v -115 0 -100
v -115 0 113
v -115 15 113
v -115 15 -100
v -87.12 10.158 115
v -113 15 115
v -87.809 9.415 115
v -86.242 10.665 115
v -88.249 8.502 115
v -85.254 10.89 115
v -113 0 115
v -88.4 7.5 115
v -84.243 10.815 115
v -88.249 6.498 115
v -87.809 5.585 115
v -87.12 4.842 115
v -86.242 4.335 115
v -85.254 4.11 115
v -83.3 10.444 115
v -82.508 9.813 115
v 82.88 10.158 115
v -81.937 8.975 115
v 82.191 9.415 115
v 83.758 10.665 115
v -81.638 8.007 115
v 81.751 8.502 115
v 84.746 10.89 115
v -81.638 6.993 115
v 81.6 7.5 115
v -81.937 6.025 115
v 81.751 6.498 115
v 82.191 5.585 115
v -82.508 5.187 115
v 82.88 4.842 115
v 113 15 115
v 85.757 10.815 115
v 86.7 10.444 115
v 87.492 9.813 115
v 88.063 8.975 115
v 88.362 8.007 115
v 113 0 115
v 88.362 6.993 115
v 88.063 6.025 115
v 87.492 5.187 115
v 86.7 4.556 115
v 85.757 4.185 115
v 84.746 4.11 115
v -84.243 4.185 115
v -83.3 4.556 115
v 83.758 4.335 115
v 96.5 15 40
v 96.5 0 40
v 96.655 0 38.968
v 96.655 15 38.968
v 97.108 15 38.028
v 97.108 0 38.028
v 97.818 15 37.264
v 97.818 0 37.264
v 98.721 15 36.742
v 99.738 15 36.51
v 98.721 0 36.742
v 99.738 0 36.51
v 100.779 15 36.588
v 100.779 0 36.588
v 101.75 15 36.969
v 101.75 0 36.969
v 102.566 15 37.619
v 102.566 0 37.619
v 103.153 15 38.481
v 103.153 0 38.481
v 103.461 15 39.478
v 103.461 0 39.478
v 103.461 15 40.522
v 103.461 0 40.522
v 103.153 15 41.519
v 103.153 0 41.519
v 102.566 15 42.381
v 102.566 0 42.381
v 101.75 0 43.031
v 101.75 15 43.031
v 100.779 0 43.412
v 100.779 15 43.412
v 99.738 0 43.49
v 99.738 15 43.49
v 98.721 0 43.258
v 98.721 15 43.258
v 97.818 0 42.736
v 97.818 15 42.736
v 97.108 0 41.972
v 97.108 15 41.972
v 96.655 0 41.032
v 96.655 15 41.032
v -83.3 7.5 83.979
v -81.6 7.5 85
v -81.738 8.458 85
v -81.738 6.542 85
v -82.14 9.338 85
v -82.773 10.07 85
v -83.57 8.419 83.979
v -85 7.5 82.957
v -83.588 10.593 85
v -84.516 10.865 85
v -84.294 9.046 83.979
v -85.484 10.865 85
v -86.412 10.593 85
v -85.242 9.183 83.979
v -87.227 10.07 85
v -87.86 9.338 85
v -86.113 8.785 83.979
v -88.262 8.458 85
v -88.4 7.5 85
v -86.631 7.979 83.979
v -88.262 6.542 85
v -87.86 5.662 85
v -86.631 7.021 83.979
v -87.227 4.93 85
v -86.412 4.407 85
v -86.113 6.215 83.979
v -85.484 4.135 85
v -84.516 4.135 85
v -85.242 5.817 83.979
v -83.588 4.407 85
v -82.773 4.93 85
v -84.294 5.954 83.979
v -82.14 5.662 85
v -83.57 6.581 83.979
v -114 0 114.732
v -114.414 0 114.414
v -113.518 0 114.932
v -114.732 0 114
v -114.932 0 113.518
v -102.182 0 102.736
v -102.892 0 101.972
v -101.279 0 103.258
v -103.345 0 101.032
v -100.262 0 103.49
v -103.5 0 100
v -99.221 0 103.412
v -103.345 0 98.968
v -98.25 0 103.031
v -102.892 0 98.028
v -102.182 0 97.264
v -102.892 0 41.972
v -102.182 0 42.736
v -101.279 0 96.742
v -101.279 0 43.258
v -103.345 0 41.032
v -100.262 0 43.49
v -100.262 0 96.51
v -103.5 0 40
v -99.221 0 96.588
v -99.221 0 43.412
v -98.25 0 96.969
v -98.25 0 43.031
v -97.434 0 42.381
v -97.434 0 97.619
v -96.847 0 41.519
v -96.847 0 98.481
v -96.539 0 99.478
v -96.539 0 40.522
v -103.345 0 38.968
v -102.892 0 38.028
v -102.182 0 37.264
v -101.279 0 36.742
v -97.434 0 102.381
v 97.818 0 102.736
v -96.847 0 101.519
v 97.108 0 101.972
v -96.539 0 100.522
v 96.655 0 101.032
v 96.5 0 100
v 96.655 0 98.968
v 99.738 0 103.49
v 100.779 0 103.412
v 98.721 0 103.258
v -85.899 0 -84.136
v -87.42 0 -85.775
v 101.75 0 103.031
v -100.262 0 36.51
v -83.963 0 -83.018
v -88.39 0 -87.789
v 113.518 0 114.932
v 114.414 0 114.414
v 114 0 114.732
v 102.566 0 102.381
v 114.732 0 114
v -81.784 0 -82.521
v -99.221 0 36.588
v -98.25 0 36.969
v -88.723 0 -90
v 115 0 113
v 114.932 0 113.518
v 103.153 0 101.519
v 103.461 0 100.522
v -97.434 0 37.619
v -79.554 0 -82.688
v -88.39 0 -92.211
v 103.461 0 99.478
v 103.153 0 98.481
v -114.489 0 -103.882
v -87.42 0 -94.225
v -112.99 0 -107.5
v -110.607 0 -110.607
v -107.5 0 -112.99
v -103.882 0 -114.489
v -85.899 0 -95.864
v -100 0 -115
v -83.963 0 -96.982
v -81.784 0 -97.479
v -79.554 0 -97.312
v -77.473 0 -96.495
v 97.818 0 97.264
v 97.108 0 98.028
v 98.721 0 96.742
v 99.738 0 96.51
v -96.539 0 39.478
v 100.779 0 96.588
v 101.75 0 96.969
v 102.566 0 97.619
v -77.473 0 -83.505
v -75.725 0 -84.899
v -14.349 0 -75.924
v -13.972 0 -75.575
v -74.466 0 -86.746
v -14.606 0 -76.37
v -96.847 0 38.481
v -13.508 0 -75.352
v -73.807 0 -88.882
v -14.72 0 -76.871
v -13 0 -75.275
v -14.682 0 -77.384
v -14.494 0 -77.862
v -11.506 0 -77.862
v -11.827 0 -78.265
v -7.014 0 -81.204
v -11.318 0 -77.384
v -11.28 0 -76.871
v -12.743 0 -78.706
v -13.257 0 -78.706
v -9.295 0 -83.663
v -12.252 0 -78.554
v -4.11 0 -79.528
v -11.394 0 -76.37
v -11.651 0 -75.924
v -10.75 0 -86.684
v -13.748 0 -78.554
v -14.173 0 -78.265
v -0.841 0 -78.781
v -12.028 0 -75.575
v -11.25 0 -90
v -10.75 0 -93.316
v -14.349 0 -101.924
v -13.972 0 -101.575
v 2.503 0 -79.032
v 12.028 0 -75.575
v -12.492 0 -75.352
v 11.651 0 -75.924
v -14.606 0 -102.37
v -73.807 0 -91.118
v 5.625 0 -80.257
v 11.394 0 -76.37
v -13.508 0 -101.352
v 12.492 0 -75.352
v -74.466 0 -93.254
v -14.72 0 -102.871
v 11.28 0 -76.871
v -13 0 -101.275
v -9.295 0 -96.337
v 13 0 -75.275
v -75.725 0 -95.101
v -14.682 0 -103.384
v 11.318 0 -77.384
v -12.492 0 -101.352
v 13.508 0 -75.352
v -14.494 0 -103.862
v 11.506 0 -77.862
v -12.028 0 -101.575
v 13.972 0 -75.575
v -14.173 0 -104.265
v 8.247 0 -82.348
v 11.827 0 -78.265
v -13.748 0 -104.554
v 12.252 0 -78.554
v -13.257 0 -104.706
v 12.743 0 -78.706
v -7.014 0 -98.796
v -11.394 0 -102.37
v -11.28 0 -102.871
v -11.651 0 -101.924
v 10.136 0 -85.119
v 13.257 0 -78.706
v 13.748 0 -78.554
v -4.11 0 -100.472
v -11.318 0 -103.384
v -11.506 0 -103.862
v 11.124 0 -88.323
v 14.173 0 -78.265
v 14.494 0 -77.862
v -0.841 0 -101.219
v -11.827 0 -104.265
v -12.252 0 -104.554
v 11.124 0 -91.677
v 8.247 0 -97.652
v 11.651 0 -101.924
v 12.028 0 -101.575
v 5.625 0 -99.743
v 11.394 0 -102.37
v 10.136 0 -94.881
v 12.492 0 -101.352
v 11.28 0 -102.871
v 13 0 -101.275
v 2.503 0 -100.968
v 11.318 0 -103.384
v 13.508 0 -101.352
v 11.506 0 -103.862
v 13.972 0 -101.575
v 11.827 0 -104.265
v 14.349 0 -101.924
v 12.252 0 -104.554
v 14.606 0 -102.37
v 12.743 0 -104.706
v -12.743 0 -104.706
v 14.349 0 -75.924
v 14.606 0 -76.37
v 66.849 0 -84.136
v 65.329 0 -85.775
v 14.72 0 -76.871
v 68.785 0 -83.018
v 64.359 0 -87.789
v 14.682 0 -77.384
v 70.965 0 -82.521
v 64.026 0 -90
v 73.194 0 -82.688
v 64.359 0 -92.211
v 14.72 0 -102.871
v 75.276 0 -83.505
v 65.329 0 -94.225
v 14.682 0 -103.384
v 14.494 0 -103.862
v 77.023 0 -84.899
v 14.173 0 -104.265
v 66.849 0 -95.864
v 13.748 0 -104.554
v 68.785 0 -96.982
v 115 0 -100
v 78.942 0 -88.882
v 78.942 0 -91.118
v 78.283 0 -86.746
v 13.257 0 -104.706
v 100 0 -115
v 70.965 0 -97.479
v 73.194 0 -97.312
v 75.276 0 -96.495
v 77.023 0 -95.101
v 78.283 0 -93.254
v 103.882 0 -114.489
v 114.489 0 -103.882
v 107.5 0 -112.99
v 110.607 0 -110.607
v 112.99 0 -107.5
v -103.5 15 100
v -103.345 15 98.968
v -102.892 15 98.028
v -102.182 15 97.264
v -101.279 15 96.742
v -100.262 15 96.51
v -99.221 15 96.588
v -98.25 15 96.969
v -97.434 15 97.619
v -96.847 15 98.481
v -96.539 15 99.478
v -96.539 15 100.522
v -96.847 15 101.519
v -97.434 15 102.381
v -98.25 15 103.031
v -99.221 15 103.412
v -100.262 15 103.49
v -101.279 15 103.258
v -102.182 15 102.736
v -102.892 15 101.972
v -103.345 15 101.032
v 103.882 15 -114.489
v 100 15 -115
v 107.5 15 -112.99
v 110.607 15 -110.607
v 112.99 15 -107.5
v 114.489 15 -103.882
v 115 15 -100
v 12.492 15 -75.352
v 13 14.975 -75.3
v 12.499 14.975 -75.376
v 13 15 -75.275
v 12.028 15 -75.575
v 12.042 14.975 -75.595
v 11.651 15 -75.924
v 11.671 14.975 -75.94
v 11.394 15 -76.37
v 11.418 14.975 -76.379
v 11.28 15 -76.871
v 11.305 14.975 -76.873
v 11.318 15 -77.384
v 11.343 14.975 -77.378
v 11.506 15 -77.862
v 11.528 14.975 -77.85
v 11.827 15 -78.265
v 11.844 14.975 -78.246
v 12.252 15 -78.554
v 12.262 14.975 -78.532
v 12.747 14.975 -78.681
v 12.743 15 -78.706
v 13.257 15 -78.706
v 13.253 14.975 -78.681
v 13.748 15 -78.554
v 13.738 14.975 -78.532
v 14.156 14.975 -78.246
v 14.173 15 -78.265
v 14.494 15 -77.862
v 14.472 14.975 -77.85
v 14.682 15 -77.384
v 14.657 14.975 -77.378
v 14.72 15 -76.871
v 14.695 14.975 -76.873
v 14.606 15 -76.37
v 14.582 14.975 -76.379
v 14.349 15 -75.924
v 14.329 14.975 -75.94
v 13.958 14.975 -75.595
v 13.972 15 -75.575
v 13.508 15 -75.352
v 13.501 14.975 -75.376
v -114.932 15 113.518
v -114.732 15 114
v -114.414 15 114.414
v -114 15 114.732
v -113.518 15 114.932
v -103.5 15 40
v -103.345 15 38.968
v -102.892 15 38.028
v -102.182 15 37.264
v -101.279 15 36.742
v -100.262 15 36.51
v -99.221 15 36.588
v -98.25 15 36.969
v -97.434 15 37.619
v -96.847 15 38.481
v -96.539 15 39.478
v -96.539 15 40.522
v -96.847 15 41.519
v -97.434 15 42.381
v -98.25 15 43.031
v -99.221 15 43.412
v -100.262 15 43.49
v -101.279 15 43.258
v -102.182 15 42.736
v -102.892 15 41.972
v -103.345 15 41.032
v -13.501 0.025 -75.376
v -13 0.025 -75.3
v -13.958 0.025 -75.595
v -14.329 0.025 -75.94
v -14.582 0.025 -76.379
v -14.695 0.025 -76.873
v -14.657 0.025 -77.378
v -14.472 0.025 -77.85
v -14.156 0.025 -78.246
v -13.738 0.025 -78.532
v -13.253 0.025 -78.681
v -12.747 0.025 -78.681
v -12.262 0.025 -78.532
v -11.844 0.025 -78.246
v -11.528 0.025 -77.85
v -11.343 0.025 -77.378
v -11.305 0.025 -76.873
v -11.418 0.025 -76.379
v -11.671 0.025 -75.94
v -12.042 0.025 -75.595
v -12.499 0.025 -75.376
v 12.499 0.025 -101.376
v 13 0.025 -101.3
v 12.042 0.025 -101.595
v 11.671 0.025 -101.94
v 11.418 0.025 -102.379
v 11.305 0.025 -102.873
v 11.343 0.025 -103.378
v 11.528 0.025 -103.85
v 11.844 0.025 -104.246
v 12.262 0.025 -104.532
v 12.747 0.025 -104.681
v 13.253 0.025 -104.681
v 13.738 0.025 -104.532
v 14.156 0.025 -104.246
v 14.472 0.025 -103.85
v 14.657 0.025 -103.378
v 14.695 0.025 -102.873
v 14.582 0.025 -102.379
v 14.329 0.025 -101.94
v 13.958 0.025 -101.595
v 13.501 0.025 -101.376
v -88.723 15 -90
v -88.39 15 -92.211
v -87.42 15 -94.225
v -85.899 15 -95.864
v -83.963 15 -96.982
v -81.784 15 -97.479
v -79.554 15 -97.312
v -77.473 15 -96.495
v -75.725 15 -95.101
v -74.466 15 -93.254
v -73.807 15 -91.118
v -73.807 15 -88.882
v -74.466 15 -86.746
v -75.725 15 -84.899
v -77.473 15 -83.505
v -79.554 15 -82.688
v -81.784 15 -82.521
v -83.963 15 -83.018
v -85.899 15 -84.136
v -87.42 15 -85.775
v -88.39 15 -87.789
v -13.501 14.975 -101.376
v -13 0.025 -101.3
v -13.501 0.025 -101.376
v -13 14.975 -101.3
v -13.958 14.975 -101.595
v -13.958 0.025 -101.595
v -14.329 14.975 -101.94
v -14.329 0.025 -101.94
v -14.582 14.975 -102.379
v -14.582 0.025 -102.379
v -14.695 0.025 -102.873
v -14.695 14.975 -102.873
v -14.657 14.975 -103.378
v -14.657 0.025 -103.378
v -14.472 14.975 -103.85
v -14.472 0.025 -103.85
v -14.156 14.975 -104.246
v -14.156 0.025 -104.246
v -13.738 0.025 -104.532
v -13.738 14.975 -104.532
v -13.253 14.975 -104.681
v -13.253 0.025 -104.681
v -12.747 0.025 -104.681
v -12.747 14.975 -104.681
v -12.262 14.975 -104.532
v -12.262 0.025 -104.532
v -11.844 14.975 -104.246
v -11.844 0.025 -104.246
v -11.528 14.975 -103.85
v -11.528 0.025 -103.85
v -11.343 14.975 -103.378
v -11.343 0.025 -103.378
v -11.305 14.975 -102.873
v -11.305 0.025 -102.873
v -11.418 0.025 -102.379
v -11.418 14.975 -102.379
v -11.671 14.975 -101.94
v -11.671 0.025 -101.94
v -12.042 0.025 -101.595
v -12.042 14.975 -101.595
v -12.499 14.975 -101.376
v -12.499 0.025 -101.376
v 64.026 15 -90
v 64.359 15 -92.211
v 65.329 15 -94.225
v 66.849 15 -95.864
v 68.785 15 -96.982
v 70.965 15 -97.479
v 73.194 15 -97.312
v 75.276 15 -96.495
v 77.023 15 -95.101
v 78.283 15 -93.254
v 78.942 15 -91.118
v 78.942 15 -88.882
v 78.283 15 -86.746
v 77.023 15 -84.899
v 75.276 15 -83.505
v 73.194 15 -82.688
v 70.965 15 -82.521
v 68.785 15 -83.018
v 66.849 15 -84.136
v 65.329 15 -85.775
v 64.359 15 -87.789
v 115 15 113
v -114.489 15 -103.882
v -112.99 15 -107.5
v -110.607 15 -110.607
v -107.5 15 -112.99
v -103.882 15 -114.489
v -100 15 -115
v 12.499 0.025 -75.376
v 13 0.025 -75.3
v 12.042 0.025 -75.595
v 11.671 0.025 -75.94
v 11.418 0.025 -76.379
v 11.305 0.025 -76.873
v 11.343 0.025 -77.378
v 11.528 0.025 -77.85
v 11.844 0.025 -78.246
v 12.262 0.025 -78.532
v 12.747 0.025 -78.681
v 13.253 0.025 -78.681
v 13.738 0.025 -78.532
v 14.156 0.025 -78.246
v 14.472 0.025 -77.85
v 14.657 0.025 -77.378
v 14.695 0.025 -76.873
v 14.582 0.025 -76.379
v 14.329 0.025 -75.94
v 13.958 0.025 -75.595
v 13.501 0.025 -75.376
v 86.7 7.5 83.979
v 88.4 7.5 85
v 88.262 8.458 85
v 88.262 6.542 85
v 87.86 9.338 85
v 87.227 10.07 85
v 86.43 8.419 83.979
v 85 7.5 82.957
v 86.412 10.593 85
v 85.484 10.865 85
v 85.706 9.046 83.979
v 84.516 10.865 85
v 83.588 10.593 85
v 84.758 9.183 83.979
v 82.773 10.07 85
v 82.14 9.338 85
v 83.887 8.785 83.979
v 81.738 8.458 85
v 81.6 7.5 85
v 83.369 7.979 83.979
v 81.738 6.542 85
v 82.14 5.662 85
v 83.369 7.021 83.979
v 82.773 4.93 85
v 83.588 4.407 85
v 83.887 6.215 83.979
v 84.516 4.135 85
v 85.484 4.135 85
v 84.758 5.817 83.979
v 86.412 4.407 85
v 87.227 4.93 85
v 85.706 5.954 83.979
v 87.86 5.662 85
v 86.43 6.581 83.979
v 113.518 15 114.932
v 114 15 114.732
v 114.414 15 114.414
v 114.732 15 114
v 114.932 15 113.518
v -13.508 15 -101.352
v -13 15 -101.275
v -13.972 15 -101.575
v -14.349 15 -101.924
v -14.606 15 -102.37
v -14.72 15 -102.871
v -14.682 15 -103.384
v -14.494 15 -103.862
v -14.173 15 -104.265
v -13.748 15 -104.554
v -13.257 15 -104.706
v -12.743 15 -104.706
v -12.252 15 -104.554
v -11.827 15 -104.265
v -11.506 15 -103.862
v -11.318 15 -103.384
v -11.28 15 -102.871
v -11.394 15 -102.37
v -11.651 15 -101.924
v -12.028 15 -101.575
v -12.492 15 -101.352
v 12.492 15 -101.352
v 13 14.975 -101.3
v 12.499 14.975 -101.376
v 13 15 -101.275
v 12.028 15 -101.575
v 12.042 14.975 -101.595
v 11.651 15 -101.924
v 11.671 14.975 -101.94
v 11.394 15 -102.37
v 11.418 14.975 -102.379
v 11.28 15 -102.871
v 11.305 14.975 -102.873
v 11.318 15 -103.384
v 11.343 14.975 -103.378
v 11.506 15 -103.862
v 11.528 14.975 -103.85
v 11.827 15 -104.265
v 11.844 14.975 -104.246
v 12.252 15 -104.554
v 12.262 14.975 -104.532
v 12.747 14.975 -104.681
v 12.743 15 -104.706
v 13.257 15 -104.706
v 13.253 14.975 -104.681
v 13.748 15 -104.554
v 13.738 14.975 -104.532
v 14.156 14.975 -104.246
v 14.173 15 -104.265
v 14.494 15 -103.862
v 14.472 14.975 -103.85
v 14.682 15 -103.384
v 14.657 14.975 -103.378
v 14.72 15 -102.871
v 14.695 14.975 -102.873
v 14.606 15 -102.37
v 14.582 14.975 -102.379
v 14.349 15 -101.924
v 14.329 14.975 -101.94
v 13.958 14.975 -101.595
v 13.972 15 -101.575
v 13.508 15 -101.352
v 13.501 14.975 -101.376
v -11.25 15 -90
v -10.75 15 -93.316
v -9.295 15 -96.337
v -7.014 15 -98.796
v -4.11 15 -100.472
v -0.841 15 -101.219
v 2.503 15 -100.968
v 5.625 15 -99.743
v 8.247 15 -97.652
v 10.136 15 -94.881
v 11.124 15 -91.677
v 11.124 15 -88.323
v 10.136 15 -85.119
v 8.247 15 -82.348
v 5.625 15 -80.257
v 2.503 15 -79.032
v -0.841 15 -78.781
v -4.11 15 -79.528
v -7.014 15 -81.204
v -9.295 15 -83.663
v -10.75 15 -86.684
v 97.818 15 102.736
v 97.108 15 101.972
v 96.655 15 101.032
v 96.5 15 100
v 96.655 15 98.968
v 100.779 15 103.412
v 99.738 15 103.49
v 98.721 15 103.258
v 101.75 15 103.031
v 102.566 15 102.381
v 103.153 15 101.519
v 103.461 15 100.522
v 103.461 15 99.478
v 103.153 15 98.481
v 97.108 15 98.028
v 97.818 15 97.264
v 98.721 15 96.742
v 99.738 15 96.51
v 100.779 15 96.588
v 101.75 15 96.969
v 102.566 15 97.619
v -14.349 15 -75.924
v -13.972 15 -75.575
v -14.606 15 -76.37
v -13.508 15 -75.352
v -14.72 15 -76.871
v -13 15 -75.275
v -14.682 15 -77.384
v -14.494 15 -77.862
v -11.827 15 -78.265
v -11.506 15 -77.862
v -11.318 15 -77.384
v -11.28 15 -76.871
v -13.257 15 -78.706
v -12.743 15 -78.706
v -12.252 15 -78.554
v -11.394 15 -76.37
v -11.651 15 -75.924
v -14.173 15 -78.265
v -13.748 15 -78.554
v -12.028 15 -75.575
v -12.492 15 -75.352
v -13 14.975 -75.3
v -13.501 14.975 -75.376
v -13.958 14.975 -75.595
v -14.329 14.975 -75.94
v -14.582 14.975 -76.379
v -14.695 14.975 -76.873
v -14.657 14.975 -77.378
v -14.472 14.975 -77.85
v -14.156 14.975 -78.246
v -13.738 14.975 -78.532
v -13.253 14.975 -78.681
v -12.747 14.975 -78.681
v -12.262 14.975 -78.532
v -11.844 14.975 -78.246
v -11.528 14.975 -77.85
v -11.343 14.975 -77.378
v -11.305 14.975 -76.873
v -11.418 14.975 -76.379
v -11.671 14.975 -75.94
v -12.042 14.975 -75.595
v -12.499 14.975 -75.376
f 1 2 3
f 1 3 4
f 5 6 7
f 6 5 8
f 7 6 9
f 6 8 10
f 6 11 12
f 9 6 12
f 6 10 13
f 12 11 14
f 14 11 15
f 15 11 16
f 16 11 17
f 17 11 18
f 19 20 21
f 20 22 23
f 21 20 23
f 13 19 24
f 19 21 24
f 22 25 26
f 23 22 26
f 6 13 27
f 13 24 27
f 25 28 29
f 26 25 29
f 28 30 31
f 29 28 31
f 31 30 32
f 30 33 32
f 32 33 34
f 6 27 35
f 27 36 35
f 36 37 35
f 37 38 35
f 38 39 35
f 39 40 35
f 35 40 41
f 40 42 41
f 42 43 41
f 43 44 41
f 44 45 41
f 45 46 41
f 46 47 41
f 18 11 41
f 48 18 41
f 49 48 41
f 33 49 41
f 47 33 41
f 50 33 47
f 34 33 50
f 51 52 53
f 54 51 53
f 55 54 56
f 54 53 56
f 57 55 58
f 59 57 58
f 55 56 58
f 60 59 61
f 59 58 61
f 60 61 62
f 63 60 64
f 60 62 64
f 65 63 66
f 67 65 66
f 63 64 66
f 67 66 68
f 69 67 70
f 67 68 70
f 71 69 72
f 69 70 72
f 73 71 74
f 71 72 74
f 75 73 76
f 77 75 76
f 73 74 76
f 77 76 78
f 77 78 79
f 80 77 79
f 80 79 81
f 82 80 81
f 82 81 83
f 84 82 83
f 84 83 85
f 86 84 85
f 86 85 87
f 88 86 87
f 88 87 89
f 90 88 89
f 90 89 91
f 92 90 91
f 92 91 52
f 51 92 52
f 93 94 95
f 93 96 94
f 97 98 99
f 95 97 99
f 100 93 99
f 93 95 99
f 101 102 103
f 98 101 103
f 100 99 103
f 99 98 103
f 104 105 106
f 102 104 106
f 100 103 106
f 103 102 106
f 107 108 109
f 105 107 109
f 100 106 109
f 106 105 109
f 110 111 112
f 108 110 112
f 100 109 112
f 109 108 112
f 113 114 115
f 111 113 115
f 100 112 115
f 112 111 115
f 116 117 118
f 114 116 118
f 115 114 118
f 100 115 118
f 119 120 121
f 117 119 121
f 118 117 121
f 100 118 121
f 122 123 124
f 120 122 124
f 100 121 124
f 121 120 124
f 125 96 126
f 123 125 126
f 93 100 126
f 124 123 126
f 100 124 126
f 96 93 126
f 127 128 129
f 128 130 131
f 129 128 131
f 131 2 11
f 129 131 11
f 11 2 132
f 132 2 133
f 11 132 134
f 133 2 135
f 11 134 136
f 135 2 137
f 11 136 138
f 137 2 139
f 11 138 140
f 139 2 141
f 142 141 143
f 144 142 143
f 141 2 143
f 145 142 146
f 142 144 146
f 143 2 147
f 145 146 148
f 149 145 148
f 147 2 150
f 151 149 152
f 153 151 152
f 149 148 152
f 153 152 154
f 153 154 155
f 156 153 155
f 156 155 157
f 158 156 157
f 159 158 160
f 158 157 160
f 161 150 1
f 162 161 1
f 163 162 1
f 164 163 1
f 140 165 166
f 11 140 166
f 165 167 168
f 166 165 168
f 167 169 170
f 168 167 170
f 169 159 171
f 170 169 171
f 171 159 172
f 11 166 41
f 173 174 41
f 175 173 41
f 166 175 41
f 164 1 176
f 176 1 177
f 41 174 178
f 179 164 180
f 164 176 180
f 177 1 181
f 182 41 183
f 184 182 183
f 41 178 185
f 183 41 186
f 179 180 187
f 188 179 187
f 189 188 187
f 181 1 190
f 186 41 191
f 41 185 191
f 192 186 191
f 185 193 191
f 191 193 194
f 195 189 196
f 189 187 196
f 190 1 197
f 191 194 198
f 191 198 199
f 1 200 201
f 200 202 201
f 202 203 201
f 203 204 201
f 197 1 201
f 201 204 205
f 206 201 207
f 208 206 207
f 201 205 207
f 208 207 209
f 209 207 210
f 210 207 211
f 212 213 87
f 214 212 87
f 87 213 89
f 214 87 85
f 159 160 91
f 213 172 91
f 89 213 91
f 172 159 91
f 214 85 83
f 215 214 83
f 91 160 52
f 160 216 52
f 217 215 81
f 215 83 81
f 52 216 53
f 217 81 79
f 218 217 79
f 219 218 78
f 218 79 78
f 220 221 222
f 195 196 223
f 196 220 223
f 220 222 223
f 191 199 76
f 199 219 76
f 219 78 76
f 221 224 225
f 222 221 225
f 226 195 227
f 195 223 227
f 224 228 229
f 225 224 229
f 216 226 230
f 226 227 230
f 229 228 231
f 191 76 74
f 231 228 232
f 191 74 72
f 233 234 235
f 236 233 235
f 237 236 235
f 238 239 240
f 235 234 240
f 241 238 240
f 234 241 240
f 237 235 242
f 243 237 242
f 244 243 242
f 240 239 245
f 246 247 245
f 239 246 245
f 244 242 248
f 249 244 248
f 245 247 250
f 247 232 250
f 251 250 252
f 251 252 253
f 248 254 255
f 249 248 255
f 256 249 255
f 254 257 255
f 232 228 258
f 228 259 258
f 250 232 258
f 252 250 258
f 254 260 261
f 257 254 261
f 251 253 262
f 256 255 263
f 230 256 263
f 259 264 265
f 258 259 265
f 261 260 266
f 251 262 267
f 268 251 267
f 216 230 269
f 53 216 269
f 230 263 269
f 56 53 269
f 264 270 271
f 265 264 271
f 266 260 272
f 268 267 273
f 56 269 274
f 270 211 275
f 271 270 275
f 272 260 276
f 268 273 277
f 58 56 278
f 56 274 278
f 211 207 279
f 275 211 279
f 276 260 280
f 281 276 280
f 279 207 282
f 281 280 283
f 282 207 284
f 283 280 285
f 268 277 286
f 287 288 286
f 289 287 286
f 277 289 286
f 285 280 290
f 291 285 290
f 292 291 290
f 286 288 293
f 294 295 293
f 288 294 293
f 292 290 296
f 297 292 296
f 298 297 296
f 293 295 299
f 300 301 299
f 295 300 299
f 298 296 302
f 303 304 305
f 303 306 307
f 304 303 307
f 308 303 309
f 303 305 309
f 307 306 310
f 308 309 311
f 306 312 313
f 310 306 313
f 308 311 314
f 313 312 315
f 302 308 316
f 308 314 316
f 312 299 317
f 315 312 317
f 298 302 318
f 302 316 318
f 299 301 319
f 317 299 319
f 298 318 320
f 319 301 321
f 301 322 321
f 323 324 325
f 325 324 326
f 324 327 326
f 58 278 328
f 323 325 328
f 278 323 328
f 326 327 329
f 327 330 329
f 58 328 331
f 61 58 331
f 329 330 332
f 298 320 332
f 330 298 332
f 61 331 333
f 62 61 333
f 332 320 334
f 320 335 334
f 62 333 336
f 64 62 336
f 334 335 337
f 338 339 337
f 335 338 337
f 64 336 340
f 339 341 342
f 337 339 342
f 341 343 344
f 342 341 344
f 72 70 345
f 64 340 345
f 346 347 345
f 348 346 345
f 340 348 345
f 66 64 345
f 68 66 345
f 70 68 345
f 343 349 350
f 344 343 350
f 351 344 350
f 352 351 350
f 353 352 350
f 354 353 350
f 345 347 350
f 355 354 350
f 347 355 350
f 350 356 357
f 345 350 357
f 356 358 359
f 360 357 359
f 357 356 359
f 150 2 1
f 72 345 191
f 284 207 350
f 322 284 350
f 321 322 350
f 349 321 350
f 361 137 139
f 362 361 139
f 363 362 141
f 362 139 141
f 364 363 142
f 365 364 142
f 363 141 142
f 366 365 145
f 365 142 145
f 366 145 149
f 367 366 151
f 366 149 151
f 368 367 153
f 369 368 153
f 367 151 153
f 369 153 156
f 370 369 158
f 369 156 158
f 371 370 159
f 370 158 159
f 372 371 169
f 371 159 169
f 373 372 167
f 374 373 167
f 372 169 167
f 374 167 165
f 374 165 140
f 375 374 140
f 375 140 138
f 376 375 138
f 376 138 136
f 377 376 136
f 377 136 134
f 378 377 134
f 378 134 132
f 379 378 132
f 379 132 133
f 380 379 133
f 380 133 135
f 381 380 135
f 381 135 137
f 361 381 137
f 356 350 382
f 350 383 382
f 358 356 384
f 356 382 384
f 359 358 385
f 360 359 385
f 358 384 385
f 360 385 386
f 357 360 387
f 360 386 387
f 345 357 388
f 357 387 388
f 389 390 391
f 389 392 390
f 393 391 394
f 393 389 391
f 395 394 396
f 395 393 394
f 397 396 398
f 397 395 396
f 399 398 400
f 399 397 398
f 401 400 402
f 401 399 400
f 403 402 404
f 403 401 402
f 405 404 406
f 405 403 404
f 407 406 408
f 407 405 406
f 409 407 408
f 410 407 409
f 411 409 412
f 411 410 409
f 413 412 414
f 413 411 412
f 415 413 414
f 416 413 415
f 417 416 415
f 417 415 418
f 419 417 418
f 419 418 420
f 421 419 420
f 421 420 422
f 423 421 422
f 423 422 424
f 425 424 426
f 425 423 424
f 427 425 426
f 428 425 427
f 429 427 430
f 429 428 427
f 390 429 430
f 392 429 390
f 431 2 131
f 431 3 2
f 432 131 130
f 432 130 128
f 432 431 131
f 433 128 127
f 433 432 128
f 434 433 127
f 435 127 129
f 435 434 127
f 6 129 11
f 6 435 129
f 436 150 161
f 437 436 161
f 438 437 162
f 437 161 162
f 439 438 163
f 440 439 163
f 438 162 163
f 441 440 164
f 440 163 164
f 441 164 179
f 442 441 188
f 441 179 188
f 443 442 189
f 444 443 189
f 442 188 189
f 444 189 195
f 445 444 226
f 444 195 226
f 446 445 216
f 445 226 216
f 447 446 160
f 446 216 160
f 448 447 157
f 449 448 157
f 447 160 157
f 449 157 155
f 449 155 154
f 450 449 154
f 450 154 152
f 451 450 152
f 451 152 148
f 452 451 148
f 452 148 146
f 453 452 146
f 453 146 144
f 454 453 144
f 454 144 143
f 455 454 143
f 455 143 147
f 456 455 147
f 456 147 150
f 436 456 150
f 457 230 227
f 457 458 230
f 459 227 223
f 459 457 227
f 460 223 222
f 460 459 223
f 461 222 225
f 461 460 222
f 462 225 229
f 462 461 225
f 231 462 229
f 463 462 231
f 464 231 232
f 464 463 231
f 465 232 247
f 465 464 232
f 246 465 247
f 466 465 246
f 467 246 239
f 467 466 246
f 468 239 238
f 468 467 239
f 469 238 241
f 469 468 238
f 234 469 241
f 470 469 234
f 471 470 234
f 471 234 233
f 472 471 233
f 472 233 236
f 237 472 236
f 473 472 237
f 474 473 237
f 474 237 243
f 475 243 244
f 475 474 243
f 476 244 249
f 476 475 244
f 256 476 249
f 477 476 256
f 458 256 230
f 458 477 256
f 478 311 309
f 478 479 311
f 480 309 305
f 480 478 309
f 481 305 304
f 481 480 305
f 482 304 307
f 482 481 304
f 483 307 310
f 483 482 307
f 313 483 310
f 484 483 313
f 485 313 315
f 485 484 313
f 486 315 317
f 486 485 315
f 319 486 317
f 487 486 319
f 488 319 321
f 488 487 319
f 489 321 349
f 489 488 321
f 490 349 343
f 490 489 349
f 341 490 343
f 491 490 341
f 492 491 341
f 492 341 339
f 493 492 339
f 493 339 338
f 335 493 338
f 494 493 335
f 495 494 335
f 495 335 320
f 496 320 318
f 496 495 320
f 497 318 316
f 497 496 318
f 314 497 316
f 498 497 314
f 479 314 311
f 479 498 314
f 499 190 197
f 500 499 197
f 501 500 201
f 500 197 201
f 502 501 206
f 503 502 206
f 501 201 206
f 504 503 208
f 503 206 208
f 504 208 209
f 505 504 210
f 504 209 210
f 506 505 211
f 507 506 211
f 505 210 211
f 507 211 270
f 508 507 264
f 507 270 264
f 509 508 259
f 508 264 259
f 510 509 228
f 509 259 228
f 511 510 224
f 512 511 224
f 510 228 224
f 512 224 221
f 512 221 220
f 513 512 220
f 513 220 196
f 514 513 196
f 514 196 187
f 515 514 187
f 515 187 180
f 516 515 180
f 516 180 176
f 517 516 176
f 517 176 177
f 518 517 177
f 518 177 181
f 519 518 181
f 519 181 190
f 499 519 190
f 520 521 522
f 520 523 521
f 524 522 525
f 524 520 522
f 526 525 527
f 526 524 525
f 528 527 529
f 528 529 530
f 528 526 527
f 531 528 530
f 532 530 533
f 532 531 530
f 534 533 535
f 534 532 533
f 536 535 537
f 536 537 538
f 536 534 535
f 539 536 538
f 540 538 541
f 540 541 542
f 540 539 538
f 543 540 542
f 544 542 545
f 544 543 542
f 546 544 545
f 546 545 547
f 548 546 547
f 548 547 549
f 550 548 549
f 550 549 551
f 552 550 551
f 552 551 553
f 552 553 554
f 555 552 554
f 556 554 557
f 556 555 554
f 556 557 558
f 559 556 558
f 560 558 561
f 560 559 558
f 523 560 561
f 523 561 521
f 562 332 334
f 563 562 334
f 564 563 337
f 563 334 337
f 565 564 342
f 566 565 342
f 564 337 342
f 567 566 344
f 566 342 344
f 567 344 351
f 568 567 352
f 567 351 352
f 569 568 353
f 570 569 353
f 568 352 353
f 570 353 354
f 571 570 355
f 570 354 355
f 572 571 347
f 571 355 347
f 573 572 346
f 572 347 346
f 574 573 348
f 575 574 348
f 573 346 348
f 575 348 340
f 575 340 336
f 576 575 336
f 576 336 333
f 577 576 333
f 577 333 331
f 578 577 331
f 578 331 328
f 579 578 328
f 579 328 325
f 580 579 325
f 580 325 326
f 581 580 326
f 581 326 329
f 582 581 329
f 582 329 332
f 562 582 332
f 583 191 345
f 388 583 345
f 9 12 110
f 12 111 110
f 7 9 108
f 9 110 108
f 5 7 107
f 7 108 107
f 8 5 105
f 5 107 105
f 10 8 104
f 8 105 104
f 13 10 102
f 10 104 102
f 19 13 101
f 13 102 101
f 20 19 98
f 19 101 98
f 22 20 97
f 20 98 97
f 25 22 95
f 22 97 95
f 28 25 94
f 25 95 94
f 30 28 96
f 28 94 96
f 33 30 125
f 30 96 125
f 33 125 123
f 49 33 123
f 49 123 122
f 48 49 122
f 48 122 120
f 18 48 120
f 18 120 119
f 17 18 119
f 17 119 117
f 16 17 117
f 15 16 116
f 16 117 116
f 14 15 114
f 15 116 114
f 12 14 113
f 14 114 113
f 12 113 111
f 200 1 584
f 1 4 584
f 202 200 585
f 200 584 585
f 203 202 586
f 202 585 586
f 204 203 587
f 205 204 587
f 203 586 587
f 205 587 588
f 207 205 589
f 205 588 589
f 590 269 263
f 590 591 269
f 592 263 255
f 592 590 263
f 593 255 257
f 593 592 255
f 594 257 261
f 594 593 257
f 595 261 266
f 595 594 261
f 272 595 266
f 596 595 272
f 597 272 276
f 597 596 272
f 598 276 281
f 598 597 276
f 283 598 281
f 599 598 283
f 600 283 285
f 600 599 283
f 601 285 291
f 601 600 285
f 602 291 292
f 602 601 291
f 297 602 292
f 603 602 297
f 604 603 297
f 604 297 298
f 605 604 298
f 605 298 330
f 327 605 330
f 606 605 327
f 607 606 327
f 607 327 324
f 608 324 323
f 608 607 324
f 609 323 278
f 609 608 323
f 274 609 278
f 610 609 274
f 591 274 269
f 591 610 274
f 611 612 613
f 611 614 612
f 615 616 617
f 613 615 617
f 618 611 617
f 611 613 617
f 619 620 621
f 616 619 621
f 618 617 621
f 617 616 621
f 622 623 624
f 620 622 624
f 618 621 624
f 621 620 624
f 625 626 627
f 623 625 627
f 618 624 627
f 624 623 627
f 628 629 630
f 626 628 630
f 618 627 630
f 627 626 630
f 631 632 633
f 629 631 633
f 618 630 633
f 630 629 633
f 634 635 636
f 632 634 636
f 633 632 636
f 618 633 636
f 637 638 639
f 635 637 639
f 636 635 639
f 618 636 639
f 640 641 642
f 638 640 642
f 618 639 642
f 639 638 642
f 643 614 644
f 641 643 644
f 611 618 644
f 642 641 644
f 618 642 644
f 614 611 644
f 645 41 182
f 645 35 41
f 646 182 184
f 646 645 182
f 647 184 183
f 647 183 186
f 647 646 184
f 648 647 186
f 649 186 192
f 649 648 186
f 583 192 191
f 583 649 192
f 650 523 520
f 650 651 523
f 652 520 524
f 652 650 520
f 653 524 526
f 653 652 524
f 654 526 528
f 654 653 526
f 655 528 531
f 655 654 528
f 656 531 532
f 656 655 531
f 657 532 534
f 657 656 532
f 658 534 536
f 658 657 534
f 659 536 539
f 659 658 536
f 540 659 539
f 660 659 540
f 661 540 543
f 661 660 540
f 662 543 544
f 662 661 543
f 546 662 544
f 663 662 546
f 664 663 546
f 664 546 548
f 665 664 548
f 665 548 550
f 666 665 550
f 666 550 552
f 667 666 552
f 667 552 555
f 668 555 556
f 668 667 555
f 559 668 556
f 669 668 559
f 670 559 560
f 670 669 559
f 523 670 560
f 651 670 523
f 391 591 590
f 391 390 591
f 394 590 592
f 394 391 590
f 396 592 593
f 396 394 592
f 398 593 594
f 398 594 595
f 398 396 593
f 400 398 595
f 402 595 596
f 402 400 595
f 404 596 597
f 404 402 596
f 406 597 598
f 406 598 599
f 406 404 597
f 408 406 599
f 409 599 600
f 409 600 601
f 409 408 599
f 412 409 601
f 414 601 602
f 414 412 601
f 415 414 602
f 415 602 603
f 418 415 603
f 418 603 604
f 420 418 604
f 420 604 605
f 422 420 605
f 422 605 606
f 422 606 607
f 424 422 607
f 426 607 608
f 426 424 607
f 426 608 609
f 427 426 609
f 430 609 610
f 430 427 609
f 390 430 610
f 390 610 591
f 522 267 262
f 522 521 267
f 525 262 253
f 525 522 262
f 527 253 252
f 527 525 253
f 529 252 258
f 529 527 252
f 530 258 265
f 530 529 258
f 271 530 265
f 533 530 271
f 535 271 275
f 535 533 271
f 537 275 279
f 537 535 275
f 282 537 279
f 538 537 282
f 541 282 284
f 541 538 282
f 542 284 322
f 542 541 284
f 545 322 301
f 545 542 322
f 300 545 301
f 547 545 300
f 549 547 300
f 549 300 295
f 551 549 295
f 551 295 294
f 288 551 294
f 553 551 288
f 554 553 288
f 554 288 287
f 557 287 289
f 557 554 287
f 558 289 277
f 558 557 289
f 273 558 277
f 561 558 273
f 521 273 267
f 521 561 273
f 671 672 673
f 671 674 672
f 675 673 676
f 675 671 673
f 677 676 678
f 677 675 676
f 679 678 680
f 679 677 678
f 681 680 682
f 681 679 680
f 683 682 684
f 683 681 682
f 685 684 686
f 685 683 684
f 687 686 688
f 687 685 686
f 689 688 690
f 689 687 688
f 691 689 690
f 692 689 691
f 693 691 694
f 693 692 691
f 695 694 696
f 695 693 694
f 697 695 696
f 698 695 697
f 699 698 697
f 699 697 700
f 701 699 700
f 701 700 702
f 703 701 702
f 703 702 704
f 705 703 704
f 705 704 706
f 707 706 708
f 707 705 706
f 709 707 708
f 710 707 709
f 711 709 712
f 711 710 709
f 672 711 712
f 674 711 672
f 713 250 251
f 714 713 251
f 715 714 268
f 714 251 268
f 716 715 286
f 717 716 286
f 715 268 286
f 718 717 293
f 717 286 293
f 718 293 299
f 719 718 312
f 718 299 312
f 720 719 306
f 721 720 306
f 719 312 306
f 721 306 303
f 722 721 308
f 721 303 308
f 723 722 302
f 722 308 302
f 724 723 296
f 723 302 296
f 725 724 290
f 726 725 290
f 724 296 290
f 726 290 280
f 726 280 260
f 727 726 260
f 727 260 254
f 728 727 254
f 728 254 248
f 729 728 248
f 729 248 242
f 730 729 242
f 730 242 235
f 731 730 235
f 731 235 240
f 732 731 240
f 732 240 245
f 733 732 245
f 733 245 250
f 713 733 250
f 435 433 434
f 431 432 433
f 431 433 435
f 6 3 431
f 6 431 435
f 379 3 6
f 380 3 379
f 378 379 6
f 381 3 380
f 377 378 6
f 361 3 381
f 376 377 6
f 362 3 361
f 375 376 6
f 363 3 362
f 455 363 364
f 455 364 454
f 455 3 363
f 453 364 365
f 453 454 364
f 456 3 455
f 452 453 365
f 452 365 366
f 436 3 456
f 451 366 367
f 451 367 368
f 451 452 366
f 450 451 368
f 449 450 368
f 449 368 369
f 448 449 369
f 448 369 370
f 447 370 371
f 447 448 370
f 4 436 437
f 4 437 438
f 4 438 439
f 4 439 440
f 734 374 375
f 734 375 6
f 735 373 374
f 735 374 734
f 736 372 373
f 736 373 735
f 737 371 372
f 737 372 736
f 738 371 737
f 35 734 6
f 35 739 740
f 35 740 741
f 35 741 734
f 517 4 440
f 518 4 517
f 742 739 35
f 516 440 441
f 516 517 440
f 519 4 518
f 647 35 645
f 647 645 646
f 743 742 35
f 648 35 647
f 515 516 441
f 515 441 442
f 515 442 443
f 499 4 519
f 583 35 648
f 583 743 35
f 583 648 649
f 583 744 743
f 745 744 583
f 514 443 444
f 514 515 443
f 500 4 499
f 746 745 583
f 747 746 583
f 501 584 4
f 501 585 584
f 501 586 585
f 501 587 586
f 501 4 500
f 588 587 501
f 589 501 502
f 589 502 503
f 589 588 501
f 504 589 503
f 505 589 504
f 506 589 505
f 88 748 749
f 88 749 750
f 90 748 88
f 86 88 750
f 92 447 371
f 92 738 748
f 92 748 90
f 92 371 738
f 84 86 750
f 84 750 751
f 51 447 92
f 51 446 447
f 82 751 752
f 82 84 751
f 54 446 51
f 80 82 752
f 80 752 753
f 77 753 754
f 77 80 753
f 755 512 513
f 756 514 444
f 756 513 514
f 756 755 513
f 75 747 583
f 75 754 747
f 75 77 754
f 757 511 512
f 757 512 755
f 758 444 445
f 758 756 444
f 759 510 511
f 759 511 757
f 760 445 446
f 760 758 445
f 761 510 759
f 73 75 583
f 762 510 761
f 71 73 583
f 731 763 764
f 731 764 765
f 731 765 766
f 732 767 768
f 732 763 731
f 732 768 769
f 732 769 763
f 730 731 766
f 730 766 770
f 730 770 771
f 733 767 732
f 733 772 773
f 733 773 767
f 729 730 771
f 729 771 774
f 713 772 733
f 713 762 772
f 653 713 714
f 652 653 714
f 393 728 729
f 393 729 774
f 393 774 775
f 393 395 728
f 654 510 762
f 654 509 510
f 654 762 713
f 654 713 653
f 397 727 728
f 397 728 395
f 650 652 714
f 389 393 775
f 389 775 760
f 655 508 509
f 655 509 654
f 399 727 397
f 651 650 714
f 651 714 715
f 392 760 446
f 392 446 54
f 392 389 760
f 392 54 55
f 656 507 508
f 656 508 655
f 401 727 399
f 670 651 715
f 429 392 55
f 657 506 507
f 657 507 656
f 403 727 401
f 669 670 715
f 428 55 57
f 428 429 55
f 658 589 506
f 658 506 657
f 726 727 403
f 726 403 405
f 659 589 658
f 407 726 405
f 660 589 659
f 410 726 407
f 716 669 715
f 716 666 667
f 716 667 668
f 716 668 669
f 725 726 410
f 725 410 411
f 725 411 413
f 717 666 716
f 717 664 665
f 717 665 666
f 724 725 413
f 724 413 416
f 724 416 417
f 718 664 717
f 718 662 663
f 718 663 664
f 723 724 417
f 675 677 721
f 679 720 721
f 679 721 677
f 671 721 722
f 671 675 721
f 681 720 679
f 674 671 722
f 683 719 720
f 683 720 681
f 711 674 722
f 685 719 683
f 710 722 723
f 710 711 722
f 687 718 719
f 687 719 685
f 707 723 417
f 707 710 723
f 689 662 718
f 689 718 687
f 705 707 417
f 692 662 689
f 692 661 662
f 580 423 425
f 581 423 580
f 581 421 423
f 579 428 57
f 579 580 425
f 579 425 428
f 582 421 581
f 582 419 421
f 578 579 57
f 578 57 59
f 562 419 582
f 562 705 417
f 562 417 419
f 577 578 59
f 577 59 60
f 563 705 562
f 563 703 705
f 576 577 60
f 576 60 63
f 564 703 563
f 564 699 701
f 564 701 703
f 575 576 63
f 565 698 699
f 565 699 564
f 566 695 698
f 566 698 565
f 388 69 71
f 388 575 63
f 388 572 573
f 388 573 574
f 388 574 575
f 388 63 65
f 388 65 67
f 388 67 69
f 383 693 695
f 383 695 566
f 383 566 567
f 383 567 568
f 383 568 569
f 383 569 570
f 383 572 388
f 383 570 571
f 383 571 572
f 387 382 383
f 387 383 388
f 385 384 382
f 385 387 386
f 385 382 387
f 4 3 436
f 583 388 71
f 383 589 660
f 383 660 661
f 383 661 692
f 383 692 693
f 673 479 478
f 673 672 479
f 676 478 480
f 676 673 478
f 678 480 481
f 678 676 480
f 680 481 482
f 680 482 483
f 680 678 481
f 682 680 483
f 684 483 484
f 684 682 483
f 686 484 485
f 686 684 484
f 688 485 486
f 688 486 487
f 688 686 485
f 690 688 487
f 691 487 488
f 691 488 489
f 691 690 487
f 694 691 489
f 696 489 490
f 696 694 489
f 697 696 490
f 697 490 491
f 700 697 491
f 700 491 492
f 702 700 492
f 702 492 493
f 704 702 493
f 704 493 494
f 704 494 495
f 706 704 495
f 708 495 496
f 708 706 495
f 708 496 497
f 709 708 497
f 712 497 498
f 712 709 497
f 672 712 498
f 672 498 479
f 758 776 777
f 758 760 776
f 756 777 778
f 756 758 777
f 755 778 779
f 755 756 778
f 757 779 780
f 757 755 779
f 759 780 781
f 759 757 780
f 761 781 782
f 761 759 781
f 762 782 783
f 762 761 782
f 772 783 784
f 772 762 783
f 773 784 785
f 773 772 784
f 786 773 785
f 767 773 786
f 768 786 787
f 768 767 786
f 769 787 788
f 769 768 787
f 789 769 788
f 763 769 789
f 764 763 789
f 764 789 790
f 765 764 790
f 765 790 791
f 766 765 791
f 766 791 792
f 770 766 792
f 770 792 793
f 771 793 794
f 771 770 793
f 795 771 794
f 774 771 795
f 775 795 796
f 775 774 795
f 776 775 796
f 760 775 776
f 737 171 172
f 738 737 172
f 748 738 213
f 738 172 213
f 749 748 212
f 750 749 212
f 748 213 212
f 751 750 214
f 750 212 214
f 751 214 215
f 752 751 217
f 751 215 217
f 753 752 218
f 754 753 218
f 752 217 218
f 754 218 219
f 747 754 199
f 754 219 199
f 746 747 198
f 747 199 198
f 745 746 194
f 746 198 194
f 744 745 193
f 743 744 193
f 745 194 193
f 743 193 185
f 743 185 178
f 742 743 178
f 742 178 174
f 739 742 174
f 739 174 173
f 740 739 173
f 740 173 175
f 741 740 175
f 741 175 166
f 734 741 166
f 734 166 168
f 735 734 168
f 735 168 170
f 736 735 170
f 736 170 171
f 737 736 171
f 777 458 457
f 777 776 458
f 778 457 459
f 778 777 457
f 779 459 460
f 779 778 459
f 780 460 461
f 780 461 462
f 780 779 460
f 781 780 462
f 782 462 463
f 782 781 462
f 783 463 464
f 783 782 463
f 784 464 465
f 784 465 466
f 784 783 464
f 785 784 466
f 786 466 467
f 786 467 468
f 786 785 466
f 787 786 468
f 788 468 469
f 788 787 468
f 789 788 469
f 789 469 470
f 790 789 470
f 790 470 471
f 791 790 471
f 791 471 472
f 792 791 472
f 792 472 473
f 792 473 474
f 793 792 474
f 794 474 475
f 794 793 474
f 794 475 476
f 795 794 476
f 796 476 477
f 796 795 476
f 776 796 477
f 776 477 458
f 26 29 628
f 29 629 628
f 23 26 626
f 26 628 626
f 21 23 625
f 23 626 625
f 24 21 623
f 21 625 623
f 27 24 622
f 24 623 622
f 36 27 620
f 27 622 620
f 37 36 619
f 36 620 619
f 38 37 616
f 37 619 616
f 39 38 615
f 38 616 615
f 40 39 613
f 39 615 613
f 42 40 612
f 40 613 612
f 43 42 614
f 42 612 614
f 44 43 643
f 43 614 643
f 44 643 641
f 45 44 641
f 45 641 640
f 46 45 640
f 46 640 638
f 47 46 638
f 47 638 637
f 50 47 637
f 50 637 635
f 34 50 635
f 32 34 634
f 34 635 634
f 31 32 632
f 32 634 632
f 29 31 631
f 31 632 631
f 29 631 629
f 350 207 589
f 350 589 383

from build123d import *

# Parameters (mm, degrees)
SKIZZE1_W                                 = 230
SKIZZE1_H                                 = 230
AUFSATZ_LINEAR_AUSTRAGEN1_DEPTH           = 15
F_15_0_15_DURCHMESSER_BOHRUNG1_D          = 15
F_3_4_3_4_DURCHMESSER_BOHRUNG1_AT_2_COUNT = 2
F_3_4_3_4_DURCHMESSER_BOHRUNG1_AT_2_PITCH = 26
F_3_4_3_4_DURCHMESSER_BOHRUNG1_AT_3_COUNT = 2
F_3_4_3_4_DURCHMESSER_BOHRUNG1_AT_3_PITCH = 26
F_3_4_3_4_DURCHMESSER_BOHRUNG1_AT_4_COUNT = 2
F_3_4_3_4_DURCHMESSER_BOHRUNG1_AT_4_PITCH = 36.769552622
F_22_5_22_5_DURCHMESSER_BOHRUNG1_D        = 22.5
F_7_0_7_DURCHMESSER_BOHRUNG1_D            = 7
VERRUNDUNG5_R                             = 15
VERRUNDUNG6_R                             = 2
M8_GEWINDEBOHRUNG1_D                      = 6.8
M8_GEWINDEBOHRUNG1_DEPTH                  = 30
M8_GEWINDEBOHRUNG1_TIP                    = 2.042926105


with BuildPart() as part:
    # Skizze1 → Aufsatz-Linear austragen1 (new body)
    with BuildSketch(Plane(origin=(0, 0, 0), x_dir=(1, 0, 0), z_dir=(0, 1, 0))):
        Rectangle(SKIZZE1_W, SKIZZE1_H)
    extrude(amount=AUFSATZ_LINEAR_AUSTRAGEN1_DEPTH)

    # Ø15.0 (15) Durchmesser Bohrung1 (through all)
    with Locations(Plane(origin=(0, 15, 0), x_dir=(1, 0, 0), z_dir=(0, 1, 0))):
        with Locations((-81.223039609, 90), (71.525536654, 90)):
            Hole(F_15_0_15_DURCHMESSER_BOHRUNG1_D / 2)

    # Skizze9 → Ø3.4 (3.4) Durchmesser Bohrung1 (revolve, cut)
    with BuildSketch(Plane(origin=(-13, 15, -103), x_dir=(0, 0, 1), z_dir=(1, 0, 0))):
        Polygon((0, 0), (0, 15), (1.725, 15), (1.7, 14.975), (1.7, 0.025), (1.725, 0), align=None)
    f_3_4_3_4_durchmesser_bohrung1 = revolve(axis=Axis((-13, 21.35, -103), (0, -1, 0)), mode=Mode.SUBTRACT)

    # Ø3.4 (3.4) Durchmesser Bohrung1 at 2: Ø3.4 (3.4) Durchmesser Bohrung1 ×2
    with Locations(*[(i * F_3_4_3_4_DURCHMESSER_BOHRUNG1_AT_2_PITCH, 0, 0) for i in range(1, F_3_4_3_4_DURCHMESSER_BOHRUNG1_AT_2_COUNT)]):
        add(f_3_4_3_4_durchmesser_bohrung1, mode=Mode.SUBTRACT)

    # Ø3.4 (3.4) Durchmesser Bohrung1 at 3: Ø3.4 (3.4) Durchmesser Bohrung1 ×2
    with Locations(*[(0, 0, i * F_3_4_3_4_DURCHMESSER_BOHRUNG1_AT_3_PITCH) for i in range(1, F_3_4_3_4_DURCHMESSER_BOHRUNG1_AT_3_COUNT)]):
        add(f_3_4_3_4_durchmesser_bohrung1, mode=Mode.SUBTRACT)

    # Ø3.4 (3.4) Durchmesser Bohrung1 at 4: Ø3.4 (3.4) Durchmesser Bohrung1 ×2
    with Locations(*[Vector(0.7071067811865476, 0, 0.7071067811865475) * (i * F_3_4_3_4_DURCHMESSER_BOHRUNG1_AT_4_PITCH) for i in range(1, F_3_4_3_4_DURCHMESSER_BOHRUNG1_AT_4_COUNT)]):
        add(f_3_4_3_4_durchmesser_bohrung1, mode=Mode.SUBTRACT)

    # Ø22.5 (22.5) Durchmesser Bohrung1 (through all)
    with Locations(Plane(origin=(0, 15, 0), x_dir=(1, 0, 0), z_dir=(0, 1, 0))):
        with Locations((0, 90)):
            Hole(F_22_5_22_5_DURCHMESSER_BOHRUNG1_D / 2)

    # Ø7.0 (7) Durchmesser Bohrung1 (through all)
    with Locations(Plane(origin=(0, 15, 0), x_dir=(1, 0, 0), z_dir=(0, 1, 0))):
        with Locations((-100, -40), (-100, -100), (100, -40), (100, -100)):
            Hole(F_7_0_7_DURCHMESSER_BOHRUNG1_D / 2)

    # Verrundung5
    verrundung5_edges = [part.edges().sort_by_distance(p)[0] for p in [
        (-115, 7.5, -115),
        (115, 7.5, -115),
    ]]
    fillet(verrundung5_edges, radius=VERRUNDUNG5_R)

    # Verrundung6
    verrundung6_edges = [part.edges().sort_by_distance(p)[0] for p in [
        (115, 7.5, 115),
        (-115, 7.5, 115),
    ]]
    fillet(verrundung6_edges, radius=VERRUNDUNG6_R)

    # M8 Gewindebohrung1
    with Locations(Plane.XY.offset(115)):
        with Locations((-85, 7.5), (85, 7.5)):
            Hole(M8_GEWINDEBOHRUNG1_D / 2, depth=M8_GEWINDEBOHRUNG1_DEPTH)
            with Locations((0, 0, -(M8_GEWINDEBOHRUNG1_DEPTH + M8_GEWINDEBOHRUNG1_TIP / 2))):  # 118° drill point
                Cone(0, M8_GEWINDEBOHRUNG1_D / 2, M8_GEWINDEBOHRUNG1_TIP, mode=Mode.SUBTRACT)


solid = part.part
